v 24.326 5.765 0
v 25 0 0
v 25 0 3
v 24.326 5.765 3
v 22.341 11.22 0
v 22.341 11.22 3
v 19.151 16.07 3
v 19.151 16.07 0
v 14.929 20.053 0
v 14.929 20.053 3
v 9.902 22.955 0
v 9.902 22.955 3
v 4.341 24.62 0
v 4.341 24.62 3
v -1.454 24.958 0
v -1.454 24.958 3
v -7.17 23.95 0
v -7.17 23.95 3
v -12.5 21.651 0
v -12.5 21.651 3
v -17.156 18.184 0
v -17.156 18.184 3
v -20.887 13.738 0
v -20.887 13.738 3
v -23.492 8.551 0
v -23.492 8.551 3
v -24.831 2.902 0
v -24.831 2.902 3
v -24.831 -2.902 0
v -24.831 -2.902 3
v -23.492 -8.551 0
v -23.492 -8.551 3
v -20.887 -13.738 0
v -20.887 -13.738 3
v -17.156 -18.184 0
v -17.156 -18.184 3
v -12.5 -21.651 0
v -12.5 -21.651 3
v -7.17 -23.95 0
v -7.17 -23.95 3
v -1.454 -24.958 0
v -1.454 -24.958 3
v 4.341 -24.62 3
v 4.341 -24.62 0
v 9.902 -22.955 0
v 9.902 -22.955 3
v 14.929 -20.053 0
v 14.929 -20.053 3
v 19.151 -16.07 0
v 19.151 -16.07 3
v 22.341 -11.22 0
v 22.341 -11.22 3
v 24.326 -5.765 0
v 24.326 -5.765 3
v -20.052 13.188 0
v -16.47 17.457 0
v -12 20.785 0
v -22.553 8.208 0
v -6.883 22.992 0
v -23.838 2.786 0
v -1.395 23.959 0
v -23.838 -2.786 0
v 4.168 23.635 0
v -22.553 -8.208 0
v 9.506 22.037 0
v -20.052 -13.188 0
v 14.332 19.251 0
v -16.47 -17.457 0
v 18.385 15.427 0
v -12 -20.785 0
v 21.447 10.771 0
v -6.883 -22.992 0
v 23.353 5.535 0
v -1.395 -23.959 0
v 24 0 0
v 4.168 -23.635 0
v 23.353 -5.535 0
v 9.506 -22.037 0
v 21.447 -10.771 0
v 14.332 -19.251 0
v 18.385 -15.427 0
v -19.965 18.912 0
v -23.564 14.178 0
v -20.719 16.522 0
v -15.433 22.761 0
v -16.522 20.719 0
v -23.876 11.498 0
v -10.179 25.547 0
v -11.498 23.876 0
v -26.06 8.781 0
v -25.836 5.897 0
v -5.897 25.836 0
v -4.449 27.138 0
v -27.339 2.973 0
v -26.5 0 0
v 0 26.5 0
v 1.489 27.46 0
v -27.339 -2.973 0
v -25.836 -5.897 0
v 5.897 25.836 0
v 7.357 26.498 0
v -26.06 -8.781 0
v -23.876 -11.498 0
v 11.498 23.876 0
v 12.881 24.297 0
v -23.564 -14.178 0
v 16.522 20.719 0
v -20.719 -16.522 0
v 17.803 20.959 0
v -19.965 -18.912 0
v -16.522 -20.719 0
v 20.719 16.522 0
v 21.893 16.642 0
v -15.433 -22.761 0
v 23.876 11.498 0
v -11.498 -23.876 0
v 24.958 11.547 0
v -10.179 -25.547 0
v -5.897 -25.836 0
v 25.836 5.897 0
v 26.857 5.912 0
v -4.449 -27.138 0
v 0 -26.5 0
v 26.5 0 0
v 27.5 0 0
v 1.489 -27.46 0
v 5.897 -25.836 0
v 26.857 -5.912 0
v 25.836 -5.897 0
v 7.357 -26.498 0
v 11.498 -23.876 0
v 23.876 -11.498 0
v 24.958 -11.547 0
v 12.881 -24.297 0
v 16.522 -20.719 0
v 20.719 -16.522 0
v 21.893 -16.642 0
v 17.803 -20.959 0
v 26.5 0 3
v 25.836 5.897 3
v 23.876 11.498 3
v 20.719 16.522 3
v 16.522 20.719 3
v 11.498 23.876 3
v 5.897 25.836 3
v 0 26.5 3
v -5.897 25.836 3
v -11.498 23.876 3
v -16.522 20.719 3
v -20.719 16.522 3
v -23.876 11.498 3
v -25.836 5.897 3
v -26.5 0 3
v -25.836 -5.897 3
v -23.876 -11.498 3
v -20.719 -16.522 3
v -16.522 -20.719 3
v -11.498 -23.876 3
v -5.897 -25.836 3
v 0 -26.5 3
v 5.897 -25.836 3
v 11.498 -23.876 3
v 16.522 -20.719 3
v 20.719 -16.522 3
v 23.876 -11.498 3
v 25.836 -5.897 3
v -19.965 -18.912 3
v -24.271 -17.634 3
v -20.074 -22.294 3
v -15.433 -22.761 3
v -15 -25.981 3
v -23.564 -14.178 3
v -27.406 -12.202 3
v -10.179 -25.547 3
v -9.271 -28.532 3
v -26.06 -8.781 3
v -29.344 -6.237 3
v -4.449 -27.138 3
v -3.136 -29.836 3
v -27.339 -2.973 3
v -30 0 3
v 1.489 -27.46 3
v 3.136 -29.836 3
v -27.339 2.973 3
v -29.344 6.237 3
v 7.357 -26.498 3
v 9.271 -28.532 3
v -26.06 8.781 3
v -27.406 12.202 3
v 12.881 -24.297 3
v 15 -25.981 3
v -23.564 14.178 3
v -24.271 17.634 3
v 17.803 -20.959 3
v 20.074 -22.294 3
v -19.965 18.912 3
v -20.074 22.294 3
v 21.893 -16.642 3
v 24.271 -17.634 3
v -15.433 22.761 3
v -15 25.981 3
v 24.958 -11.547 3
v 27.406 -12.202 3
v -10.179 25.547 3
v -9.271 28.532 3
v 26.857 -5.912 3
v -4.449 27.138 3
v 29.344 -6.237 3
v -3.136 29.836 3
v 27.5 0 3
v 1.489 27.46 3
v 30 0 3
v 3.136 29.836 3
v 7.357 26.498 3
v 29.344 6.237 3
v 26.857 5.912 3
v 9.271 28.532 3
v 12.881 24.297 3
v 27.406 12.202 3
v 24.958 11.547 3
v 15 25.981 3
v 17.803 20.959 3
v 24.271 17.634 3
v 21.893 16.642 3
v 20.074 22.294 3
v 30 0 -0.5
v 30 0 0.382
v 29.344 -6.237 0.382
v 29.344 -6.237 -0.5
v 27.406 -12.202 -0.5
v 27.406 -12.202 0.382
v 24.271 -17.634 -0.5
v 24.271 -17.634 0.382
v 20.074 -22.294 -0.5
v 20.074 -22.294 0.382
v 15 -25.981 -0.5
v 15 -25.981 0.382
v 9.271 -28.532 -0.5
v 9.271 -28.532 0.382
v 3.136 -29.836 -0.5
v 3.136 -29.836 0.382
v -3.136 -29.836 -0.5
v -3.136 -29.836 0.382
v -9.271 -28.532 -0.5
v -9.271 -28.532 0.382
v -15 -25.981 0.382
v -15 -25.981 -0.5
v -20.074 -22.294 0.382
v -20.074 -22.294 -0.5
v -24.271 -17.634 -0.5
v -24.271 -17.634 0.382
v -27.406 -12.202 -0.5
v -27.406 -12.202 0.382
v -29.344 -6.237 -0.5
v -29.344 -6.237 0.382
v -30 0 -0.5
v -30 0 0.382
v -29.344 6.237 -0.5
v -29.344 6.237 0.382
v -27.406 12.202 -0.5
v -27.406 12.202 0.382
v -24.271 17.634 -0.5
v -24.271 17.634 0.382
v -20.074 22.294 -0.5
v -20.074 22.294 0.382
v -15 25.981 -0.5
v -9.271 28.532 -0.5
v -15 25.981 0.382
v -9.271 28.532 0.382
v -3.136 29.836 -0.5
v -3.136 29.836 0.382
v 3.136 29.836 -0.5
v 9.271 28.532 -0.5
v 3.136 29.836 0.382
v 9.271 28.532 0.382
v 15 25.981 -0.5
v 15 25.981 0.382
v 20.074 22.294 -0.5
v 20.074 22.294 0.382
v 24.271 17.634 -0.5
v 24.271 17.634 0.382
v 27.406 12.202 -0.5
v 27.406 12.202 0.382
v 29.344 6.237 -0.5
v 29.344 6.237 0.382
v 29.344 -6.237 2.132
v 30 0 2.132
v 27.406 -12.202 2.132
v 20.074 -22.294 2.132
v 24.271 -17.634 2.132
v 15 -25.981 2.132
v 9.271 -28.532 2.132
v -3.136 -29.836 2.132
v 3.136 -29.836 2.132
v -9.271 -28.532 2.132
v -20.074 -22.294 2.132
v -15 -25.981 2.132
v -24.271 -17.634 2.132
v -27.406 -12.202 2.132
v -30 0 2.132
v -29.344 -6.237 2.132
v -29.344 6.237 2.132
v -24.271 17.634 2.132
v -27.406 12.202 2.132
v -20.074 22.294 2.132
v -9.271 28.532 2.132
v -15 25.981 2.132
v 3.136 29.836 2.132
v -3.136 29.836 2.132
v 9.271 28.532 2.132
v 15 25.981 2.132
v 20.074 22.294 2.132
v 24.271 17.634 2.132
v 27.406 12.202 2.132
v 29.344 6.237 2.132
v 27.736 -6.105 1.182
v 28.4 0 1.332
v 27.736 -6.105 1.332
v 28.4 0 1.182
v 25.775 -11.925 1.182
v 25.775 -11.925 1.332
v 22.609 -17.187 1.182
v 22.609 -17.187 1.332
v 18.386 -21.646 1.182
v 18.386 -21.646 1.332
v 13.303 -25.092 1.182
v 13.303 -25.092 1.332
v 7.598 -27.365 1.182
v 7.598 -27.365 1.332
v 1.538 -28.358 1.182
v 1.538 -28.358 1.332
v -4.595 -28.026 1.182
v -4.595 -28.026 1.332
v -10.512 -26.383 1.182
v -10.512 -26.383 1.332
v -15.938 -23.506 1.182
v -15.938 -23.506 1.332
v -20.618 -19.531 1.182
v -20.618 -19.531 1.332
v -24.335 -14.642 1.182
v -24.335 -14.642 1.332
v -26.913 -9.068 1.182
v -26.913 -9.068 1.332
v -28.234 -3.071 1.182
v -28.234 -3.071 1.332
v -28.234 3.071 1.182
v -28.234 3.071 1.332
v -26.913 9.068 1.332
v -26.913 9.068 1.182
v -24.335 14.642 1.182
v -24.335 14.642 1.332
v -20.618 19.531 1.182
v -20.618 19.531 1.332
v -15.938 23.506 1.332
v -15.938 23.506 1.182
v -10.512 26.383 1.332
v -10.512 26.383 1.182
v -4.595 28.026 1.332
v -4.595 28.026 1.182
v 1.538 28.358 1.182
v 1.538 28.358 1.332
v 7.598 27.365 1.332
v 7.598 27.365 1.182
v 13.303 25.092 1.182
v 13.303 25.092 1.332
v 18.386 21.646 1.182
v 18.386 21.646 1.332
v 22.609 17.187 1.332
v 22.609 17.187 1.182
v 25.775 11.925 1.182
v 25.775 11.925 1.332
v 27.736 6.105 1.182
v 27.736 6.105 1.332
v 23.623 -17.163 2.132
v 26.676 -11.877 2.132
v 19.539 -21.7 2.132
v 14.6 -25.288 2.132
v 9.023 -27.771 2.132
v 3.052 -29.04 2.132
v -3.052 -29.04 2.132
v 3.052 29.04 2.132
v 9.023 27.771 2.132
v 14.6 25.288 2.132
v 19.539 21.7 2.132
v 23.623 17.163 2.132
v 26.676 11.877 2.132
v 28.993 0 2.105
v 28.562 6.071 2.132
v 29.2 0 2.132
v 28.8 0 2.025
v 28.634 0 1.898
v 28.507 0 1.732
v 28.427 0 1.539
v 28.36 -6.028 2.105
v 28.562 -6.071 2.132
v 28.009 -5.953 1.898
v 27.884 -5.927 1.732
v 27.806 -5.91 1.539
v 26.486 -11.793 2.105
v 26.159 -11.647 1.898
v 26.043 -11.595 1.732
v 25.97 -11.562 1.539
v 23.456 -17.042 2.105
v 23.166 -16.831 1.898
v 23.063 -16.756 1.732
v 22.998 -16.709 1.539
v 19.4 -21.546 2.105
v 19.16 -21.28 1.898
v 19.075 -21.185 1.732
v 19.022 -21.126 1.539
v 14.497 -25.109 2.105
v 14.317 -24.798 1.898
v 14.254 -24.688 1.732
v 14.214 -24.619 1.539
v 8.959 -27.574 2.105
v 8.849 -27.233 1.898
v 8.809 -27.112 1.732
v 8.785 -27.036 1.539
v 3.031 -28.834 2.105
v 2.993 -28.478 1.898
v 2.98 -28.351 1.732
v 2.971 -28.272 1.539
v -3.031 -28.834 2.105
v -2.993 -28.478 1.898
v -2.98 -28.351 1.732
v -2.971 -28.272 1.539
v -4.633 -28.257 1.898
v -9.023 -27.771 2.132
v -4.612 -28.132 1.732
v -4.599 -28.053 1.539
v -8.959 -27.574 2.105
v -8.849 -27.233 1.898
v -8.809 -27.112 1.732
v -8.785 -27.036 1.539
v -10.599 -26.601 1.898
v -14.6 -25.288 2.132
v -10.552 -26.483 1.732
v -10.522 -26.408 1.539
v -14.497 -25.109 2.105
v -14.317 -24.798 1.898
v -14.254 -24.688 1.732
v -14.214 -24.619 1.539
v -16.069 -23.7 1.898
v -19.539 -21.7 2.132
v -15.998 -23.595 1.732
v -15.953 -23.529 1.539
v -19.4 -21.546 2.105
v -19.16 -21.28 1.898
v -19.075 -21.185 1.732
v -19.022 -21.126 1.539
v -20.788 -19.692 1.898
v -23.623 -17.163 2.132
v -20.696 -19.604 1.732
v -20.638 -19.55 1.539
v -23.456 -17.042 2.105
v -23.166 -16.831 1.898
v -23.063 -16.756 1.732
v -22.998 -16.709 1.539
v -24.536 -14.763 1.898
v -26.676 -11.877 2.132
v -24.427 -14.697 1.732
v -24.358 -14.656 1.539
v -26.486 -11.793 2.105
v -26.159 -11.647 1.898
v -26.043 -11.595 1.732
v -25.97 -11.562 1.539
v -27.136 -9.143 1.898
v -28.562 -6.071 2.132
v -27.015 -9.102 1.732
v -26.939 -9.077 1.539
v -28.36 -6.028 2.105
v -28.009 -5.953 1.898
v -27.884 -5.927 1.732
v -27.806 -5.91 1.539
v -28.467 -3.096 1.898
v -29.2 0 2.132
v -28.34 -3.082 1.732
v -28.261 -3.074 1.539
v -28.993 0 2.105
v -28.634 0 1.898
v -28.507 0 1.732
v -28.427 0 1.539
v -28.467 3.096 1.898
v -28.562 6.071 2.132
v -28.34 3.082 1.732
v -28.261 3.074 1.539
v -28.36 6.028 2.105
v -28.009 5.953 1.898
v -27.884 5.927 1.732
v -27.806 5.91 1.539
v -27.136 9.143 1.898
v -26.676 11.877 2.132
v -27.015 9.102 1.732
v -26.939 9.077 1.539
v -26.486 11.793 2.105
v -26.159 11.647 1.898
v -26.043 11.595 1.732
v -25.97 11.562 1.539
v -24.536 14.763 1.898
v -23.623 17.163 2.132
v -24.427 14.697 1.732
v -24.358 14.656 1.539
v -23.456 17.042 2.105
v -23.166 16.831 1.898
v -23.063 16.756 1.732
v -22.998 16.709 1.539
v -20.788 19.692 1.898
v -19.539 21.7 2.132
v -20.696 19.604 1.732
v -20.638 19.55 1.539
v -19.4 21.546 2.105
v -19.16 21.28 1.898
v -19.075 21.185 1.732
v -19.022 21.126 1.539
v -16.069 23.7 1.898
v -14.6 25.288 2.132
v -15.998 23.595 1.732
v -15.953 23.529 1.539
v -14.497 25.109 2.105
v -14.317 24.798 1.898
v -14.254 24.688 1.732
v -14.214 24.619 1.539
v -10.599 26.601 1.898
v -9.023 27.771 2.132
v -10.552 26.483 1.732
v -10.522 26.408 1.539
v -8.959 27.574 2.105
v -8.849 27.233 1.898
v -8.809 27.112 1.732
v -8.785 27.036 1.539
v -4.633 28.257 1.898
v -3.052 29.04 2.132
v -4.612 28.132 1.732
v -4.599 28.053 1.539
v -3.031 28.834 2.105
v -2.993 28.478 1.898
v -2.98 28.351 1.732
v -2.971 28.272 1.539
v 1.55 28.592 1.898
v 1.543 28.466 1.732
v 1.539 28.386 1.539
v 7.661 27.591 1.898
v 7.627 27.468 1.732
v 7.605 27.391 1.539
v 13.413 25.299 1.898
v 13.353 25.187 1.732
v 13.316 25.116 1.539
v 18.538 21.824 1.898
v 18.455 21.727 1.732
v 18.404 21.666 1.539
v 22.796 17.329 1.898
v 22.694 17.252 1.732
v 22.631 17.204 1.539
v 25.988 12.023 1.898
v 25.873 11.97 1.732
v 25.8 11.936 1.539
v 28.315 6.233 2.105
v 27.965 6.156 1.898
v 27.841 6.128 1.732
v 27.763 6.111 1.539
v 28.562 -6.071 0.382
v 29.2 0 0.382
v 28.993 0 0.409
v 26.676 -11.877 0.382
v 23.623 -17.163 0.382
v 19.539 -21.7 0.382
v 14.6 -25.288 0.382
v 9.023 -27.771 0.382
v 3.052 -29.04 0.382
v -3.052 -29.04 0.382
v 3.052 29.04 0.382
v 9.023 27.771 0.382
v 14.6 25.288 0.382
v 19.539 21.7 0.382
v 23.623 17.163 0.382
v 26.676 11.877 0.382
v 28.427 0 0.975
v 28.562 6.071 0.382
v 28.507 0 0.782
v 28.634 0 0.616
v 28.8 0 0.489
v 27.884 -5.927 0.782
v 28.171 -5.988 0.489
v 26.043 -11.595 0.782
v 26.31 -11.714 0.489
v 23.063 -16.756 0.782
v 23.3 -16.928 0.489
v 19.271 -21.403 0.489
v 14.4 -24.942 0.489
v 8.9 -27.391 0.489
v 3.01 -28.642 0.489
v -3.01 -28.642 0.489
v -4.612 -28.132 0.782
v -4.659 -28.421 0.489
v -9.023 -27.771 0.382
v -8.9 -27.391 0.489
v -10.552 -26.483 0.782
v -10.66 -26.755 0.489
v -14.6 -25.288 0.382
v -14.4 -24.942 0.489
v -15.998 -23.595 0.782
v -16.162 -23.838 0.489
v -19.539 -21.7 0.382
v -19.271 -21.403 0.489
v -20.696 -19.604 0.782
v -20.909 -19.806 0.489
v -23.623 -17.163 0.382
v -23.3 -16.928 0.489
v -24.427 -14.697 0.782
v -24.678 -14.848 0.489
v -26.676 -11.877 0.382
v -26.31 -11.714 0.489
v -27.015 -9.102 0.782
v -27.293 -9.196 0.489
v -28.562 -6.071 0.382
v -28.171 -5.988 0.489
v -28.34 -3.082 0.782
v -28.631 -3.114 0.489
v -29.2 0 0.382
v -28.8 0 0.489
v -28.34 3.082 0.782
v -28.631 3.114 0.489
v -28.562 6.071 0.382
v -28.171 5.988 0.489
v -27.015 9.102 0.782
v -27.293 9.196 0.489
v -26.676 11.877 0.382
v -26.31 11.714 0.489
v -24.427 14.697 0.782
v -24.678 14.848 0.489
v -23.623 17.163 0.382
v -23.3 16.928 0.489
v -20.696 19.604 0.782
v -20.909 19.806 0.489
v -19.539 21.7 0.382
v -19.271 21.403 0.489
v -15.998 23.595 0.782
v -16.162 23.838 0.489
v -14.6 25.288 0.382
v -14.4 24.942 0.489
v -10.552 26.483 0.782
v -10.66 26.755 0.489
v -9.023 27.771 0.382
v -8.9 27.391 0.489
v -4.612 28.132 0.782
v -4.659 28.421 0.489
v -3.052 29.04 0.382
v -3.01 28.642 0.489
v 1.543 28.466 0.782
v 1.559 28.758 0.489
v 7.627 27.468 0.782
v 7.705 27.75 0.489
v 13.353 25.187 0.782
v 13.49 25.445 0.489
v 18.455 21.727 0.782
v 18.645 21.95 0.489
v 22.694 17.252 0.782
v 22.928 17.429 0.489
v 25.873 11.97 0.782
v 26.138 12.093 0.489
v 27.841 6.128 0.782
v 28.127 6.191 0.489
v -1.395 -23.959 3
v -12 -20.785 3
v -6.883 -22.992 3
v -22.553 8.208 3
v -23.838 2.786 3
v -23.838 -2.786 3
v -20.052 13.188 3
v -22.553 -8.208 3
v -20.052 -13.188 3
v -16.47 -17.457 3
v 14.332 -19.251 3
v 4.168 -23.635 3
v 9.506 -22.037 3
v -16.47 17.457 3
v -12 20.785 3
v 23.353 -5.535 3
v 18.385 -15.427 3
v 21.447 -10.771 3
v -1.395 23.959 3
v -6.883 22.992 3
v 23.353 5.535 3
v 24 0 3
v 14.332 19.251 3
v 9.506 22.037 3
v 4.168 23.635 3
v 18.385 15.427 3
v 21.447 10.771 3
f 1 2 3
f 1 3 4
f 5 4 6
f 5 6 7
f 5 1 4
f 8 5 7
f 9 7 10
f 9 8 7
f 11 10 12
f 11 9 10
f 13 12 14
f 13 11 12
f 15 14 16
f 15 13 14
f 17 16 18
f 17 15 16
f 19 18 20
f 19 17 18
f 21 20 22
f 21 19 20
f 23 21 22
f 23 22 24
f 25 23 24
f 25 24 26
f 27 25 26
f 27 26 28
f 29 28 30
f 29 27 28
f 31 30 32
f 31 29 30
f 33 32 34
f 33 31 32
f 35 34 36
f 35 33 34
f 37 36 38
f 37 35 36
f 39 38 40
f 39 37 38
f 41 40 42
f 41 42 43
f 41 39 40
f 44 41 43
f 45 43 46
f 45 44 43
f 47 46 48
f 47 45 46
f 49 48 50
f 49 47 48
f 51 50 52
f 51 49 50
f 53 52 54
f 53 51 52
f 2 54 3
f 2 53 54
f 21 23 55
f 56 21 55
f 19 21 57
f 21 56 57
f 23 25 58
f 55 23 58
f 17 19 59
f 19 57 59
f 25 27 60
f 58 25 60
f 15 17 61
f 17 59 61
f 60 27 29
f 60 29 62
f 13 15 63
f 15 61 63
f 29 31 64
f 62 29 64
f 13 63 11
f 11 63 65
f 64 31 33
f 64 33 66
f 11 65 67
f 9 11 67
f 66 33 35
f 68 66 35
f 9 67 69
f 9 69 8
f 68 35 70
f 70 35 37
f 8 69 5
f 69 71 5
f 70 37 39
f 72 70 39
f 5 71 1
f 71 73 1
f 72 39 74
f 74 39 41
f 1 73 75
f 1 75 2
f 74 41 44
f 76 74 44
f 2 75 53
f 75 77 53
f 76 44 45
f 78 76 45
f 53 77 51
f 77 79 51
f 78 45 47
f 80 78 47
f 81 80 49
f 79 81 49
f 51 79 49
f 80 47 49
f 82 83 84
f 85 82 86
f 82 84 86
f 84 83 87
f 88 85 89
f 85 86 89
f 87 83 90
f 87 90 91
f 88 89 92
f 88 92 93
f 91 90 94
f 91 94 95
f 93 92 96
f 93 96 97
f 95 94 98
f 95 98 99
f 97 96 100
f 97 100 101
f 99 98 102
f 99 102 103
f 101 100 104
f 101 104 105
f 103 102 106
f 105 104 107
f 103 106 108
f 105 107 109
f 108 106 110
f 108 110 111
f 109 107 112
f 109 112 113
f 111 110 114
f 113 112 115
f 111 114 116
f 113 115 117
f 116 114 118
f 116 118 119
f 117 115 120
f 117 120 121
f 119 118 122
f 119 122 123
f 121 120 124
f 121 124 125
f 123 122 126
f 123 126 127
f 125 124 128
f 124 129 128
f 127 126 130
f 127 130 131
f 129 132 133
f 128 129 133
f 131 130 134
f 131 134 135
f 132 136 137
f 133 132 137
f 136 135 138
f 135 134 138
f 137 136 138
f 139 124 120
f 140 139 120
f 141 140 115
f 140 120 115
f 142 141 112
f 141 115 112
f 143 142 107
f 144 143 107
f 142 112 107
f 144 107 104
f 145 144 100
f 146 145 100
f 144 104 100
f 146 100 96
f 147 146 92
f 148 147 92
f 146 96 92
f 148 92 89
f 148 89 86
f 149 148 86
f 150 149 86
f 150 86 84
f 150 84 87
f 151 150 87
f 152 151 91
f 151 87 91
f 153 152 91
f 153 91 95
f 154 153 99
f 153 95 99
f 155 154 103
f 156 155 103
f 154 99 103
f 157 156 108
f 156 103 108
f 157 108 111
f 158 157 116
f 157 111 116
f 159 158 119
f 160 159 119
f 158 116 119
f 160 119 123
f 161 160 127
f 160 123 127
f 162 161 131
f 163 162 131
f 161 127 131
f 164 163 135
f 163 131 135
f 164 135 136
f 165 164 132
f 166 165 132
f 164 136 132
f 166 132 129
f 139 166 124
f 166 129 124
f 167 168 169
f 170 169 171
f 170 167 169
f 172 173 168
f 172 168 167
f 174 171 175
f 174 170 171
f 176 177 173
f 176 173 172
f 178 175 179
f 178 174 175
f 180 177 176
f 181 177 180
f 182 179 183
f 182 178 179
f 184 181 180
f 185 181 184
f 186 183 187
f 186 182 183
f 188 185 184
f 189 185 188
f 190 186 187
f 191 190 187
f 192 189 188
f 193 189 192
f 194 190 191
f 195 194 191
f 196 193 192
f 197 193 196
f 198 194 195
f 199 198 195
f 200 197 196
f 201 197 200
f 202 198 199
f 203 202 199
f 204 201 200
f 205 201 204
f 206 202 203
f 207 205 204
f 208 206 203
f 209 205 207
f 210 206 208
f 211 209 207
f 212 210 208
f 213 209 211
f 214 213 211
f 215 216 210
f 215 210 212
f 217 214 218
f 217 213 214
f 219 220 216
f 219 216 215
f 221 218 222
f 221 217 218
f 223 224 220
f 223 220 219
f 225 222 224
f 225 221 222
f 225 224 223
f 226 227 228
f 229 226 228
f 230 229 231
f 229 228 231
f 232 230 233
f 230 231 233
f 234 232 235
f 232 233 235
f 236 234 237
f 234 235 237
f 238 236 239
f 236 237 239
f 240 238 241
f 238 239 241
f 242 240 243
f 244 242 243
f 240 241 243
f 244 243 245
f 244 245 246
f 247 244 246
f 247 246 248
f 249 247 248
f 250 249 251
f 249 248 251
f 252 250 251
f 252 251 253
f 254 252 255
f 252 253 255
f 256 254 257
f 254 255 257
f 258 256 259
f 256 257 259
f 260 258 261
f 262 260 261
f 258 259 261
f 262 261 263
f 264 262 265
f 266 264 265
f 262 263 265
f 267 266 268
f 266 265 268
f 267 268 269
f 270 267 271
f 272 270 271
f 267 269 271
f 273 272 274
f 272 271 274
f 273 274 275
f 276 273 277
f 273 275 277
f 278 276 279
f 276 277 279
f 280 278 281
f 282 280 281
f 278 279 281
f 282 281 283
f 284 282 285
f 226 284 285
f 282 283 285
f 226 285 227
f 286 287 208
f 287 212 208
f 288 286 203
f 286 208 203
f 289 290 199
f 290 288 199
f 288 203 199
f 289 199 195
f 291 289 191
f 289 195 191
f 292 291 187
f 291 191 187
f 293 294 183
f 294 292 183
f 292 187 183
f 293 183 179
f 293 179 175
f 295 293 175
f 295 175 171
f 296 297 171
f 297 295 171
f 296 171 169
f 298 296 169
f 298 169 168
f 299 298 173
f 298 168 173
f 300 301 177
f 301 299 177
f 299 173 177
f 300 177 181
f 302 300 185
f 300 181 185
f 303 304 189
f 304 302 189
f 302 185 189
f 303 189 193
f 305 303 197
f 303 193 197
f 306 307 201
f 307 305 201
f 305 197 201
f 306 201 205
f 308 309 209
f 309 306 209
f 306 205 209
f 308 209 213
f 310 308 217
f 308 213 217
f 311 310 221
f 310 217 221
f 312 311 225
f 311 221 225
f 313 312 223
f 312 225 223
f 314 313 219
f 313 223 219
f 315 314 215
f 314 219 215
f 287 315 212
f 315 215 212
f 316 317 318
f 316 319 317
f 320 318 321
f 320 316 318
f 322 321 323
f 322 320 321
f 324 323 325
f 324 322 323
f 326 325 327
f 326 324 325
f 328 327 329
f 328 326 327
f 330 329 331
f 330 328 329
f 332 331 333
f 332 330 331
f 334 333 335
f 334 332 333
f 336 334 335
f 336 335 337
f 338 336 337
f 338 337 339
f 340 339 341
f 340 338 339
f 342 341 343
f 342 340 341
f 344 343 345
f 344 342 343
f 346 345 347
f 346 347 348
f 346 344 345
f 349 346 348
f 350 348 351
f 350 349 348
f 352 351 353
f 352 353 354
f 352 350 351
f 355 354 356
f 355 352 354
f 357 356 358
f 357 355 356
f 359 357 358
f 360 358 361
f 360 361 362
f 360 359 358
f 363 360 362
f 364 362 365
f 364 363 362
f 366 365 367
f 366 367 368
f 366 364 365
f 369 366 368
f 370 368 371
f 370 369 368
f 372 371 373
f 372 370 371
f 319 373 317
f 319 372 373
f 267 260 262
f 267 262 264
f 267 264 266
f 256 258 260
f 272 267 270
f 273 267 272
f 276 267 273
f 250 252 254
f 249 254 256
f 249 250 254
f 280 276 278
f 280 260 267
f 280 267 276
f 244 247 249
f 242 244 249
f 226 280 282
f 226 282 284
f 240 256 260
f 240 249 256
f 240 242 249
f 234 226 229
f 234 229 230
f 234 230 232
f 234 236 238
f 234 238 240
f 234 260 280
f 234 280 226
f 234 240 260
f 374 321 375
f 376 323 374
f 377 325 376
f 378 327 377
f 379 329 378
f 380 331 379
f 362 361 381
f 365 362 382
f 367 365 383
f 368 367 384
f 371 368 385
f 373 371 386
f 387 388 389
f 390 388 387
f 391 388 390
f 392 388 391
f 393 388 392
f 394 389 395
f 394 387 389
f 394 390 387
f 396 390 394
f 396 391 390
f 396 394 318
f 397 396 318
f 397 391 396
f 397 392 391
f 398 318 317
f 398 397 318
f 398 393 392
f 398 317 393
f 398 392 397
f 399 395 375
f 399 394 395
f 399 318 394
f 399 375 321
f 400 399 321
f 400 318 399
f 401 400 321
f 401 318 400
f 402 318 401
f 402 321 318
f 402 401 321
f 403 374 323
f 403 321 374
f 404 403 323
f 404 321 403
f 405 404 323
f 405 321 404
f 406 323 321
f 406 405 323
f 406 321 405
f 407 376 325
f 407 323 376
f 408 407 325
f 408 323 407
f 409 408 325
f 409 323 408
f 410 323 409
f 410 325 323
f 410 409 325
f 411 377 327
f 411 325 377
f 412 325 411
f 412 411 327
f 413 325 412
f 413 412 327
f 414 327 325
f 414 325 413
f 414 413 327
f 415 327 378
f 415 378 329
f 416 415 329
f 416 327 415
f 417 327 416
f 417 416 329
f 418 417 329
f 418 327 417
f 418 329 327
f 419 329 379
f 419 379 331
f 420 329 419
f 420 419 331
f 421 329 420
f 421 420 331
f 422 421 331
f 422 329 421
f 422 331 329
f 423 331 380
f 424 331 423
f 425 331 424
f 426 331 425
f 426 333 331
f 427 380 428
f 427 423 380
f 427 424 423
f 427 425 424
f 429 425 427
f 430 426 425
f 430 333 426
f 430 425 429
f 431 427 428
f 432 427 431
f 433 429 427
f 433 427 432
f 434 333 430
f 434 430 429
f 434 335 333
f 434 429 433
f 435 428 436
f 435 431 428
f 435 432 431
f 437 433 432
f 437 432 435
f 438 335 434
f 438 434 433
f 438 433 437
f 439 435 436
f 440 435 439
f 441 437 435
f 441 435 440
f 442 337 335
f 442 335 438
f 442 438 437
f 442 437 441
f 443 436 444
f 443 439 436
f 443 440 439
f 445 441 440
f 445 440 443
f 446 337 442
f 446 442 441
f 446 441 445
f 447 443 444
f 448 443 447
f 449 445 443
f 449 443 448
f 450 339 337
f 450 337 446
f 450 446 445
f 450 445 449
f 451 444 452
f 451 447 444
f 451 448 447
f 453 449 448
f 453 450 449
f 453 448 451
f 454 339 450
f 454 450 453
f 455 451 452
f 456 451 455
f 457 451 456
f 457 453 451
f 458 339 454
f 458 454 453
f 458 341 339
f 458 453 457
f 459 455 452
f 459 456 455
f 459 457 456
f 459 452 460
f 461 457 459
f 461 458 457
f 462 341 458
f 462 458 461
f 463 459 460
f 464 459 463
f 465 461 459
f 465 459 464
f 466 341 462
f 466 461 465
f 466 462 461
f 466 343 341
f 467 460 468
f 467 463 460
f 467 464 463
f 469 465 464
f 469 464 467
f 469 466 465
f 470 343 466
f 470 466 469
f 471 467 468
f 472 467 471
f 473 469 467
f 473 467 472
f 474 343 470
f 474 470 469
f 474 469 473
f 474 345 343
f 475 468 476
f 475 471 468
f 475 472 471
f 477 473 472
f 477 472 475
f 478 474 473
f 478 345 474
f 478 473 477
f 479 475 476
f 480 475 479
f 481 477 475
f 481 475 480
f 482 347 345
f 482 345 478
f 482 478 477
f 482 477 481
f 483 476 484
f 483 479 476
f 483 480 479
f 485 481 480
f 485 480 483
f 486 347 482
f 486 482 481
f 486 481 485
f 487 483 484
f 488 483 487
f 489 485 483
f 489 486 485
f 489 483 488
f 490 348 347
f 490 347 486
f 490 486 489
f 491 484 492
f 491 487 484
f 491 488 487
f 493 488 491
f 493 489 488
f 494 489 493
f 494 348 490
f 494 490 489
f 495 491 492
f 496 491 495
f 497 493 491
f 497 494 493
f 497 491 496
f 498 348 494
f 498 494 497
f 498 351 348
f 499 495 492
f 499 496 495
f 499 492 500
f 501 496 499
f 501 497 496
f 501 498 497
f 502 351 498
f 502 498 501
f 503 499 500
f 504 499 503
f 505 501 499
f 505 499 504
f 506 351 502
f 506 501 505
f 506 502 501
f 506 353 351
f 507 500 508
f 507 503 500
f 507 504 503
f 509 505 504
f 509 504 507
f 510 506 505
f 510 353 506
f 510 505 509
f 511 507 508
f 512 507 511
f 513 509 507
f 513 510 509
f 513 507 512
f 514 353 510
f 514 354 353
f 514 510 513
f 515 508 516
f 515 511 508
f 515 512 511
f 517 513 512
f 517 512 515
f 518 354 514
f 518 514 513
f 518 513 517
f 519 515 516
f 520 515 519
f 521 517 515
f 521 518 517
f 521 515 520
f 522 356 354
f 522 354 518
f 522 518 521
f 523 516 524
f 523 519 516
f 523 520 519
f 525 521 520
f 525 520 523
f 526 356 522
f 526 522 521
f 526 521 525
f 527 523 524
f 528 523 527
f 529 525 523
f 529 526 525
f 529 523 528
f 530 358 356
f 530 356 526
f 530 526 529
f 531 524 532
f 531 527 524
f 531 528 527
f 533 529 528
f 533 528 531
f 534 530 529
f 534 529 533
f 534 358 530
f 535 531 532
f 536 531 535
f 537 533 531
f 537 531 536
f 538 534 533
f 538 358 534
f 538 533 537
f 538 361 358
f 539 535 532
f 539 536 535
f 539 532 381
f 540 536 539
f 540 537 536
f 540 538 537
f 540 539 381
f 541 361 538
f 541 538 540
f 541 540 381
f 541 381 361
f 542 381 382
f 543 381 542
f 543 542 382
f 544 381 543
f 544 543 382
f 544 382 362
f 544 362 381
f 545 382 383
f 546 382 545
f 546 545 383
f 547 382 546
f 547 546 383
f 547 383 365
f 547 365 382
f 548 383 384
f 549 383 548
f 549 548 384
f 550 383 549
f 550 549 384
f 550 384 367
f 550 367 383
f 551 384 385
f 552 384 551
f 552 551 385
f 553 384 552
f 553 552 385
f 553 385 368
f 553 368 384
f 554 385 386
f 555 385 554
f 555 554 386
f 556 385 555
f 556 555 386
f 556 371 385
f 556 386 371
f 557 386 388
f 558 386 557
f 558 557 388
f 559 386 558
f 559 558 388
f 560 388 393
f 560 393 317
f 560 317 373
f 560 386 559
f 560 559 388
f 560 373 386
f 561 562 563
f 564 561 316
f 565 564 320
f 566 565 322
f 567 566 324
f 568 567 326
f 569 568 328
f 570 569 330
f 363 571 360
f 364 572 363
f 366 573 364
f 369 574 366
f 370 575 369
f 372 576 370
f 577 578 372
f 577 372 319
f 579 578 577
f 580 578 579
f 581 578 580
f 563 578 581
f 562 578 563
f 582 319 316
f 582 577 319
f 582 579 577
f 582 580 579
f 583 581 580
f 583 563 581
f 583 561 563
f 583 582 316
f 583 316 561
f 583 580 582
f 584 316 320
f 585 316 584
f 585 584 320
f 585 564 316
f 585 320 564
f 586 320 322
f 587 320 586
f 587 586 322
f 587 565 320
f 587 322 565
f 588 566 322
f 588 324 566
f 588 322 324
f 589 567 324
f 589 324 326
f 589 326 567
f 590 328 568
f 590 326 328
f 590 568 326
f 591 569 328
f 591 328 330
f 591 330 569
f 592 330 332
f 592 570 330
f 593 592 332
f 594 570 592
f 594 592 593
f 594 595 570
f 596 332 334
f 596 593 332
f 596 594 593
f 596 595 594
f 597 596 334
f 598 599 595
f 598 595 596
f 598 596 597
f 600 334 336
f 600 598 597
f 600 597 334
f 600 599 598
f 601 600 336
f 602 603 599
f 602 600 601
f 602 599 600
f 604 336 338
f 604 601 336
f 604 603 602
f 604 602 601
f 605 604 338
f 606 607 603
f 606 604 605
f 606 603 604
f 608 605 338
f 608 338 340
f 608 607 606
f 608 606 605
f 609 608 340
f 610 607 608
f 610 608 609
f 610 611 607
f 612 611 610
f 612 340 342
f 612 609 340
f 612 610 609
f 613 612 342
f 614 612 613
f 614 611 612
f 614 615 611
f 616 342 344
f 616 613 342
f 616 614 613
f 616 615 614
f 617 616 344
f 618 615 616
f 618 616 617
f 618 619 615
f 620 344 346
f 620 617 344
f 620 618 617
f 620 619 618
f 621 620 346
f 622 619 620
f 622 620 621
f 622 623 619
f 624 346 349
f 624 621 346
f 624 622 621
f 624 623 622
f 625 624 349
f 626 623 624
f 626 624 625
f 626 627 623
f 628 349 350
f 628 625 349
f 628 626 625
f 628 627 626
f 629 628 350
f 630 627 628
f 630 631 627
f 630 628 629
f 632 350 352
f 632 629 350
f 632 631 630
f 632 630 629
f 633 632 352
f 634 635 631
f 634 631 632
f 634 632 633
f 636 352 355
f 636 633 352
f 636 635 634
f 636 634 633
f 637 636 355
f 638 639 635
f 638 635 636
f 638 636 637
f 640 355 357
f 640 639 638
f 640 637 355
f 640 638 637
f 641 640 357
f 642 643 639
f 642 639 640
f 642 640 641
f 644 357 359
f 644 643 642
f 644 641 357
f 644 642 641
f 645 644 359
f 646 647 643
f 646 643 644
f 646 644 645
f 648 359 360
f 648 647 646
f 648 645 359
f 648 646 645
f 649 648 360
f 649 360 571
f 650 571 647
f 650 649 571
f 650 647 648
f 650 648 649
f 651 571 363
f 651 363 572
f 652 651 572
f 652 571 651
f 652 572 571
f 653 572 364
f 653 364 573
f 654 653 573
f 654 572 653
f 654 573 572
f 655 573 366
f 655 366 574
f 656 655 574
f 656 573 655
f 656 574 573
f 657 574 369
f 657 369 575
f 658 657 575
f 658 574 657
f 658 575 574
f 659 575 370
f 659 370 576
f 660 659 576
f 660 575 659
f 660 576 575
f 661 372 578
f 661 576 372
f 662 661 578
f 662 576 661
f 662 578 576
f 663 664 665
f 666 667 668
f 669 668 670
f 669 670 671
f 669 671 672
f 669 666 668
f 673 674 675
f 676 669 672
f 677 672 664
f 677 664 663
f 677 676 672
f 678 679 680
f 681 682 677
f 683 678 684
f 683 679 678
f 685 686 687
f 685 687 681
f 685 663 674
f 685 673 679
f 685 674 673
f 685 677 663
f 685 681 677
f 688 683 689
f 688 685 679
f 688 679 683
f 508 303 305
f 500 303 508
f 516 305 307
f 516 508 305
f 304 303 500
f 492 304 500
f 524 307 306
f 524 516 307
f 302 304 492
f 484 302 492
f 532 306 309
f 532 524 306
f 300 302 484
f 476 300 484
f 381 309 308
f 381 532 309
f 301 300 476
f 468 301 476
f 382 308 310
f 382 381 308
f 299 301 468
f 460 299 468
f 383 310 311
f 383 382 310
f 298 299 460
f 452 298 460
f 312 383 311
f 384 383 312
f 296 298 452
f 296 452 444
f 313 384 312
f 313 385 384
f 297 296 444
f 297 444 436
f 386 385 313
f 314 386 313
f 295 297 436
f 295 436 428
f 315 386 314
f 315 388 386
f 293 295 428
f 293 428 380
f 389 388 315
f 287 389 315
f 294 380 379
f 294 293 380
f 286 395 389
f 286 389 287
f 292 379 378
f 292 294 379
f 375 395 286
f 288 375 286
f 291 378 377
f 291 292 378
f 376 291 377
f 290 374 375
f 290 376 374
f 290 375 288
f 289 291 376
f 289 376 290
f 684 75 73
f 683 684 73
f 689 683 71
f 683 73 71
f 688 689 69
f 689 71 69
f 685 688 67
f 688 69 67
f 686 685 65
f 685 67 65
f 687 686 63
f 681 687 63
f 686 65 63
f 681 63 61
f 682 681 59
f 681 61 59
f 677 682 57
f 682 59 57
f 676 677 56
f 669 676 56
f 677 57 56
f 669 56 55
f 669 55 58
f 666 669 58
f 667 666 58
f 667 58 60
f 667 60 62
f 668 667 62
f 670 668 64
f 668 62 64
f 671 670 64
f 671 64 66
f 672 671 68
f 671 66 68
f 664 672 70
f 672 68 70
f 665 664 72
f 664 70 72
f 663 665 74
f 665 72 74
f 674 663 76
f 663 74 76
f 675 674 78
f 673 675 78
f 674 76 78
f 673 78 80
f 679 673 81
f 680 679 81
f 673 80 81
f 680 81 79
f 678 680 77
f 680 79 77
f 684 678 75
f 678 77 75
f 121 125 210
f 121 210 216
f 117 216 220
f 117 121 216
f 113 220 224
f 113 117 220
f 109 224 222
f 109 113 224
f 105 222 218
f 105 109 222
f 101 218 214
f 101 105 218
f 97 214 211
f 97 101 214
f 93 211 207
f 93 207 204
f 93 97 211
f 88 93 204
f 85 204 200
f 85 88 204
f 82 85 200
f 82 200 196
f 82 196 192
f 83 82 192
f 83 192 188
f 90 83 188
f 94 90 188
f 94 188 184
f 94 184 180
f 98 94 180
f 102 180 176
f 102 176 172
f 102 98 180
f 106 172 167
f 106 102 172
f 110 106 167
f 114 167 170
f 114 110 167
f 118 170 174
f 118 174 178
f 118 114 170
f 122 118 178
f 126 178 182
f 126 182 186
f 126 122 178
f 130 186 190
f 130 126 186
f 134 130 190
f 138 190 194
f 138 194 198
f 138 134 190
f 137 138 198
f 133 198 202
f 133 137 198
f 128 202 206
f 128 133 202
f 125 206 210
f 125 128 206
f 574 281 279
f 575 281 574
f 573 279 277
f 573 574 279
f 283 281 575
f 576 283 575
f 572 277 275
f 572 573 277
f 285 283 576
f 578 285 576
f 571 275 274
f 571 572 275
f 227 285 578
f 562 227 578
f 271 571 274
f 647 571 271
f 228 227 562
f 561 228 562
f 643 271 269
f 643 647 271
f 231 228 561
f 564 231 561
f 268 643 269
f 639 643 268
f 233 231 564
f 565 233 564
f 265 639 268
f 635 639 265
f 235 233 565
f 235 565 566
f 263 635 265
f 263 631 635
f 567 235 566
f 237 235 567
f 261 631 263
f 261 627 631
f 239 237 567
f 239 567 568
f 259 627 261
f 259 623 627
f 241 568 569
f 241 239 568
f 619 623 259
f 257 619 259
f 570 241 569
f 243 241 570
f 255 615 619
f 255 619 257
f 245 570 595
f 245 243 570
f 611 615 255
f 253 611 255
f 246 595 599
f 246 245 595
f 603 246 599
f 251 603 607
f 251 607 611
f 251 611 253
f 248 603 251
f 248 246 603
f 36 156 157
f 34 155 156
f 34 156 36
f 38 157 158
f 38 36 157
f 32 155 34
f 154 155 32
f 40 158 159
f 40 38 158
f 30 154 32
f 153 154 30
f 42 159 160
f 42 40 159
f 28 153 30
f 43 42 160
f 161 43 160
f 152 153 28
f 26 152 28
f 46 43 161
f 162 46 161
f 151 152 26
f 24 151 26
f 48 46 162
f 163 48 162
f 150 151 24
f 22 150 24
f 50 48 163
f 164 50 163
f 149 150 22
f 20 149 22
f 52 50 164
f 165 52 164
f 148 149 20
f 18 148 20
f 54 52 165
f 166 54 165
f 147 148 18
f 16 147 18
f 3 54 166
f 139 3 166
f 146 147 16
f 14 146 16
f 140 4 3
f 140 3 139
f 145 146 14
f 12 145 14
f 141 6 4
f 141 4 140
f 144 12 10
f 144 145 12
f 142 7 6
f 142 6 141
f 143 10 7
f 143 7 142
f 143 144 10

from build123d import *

# Parameters (mm, degrees)
F0_R     = 30
F0_R_2   = 27.5
F0_R_3   = 26.5
F0_R_4   = 25
F0_R_5   = 24
F1_DEPTH = 3
F2_R     = 30
F3_DEPTH = 0.5


with BuildPart() as f1:
    # F0 (on Top) → F1 (new body)
    with BuildSketch(Plane.XY):
        Circle(F0_R)
        Circle(F0_R_2, mode=Mode.SUBTRACT)
        Circle(F0_R_3)
        Circle(F0_R_4, mode=Mode.SUBTRACT)
        Circle(F0_R_5)
    extrude(amount=F1_DEPTH)

    # F2 (on face) → F3 (join)
    with BuildSketch(Plane(origin=(0, 0, 0), x_dir=(1, 0, 0), z_dir=(0, 0, -1))):
        Circle(F2_R)
    extrude(amount=F3_DEPTH)

    # F4 (on Front) → F5 (revolve, cut)
    with BuildSketch(Plane.XZ):
        with BuildLine():
            Line((29.200135, 0.382014), (30.000135, 0.382014))
            ThreePointArc((30.000135, 0.382014), (30.875135, 1.257014), (30.000135, 2.132014))
            Line((30.000135, 2.132014), (29.200135, 2.132014))
            ThreePointArc((29.200135, 2.132014), (28.63445, 1.897699), (28.400135, 1.332014))
            Line((28.400135, 1.332014), (28.400135, 1.182014))
            ThreePointArc((28.400135, 1.182014), (28.63445, 0.616328), (29.200135, 0.382014))
        make_face()
    revolve(axis=Axis((0, 0, 0), (0, 0, -1)), mode=Mode.SUBTRACT)


solid = f1.part
